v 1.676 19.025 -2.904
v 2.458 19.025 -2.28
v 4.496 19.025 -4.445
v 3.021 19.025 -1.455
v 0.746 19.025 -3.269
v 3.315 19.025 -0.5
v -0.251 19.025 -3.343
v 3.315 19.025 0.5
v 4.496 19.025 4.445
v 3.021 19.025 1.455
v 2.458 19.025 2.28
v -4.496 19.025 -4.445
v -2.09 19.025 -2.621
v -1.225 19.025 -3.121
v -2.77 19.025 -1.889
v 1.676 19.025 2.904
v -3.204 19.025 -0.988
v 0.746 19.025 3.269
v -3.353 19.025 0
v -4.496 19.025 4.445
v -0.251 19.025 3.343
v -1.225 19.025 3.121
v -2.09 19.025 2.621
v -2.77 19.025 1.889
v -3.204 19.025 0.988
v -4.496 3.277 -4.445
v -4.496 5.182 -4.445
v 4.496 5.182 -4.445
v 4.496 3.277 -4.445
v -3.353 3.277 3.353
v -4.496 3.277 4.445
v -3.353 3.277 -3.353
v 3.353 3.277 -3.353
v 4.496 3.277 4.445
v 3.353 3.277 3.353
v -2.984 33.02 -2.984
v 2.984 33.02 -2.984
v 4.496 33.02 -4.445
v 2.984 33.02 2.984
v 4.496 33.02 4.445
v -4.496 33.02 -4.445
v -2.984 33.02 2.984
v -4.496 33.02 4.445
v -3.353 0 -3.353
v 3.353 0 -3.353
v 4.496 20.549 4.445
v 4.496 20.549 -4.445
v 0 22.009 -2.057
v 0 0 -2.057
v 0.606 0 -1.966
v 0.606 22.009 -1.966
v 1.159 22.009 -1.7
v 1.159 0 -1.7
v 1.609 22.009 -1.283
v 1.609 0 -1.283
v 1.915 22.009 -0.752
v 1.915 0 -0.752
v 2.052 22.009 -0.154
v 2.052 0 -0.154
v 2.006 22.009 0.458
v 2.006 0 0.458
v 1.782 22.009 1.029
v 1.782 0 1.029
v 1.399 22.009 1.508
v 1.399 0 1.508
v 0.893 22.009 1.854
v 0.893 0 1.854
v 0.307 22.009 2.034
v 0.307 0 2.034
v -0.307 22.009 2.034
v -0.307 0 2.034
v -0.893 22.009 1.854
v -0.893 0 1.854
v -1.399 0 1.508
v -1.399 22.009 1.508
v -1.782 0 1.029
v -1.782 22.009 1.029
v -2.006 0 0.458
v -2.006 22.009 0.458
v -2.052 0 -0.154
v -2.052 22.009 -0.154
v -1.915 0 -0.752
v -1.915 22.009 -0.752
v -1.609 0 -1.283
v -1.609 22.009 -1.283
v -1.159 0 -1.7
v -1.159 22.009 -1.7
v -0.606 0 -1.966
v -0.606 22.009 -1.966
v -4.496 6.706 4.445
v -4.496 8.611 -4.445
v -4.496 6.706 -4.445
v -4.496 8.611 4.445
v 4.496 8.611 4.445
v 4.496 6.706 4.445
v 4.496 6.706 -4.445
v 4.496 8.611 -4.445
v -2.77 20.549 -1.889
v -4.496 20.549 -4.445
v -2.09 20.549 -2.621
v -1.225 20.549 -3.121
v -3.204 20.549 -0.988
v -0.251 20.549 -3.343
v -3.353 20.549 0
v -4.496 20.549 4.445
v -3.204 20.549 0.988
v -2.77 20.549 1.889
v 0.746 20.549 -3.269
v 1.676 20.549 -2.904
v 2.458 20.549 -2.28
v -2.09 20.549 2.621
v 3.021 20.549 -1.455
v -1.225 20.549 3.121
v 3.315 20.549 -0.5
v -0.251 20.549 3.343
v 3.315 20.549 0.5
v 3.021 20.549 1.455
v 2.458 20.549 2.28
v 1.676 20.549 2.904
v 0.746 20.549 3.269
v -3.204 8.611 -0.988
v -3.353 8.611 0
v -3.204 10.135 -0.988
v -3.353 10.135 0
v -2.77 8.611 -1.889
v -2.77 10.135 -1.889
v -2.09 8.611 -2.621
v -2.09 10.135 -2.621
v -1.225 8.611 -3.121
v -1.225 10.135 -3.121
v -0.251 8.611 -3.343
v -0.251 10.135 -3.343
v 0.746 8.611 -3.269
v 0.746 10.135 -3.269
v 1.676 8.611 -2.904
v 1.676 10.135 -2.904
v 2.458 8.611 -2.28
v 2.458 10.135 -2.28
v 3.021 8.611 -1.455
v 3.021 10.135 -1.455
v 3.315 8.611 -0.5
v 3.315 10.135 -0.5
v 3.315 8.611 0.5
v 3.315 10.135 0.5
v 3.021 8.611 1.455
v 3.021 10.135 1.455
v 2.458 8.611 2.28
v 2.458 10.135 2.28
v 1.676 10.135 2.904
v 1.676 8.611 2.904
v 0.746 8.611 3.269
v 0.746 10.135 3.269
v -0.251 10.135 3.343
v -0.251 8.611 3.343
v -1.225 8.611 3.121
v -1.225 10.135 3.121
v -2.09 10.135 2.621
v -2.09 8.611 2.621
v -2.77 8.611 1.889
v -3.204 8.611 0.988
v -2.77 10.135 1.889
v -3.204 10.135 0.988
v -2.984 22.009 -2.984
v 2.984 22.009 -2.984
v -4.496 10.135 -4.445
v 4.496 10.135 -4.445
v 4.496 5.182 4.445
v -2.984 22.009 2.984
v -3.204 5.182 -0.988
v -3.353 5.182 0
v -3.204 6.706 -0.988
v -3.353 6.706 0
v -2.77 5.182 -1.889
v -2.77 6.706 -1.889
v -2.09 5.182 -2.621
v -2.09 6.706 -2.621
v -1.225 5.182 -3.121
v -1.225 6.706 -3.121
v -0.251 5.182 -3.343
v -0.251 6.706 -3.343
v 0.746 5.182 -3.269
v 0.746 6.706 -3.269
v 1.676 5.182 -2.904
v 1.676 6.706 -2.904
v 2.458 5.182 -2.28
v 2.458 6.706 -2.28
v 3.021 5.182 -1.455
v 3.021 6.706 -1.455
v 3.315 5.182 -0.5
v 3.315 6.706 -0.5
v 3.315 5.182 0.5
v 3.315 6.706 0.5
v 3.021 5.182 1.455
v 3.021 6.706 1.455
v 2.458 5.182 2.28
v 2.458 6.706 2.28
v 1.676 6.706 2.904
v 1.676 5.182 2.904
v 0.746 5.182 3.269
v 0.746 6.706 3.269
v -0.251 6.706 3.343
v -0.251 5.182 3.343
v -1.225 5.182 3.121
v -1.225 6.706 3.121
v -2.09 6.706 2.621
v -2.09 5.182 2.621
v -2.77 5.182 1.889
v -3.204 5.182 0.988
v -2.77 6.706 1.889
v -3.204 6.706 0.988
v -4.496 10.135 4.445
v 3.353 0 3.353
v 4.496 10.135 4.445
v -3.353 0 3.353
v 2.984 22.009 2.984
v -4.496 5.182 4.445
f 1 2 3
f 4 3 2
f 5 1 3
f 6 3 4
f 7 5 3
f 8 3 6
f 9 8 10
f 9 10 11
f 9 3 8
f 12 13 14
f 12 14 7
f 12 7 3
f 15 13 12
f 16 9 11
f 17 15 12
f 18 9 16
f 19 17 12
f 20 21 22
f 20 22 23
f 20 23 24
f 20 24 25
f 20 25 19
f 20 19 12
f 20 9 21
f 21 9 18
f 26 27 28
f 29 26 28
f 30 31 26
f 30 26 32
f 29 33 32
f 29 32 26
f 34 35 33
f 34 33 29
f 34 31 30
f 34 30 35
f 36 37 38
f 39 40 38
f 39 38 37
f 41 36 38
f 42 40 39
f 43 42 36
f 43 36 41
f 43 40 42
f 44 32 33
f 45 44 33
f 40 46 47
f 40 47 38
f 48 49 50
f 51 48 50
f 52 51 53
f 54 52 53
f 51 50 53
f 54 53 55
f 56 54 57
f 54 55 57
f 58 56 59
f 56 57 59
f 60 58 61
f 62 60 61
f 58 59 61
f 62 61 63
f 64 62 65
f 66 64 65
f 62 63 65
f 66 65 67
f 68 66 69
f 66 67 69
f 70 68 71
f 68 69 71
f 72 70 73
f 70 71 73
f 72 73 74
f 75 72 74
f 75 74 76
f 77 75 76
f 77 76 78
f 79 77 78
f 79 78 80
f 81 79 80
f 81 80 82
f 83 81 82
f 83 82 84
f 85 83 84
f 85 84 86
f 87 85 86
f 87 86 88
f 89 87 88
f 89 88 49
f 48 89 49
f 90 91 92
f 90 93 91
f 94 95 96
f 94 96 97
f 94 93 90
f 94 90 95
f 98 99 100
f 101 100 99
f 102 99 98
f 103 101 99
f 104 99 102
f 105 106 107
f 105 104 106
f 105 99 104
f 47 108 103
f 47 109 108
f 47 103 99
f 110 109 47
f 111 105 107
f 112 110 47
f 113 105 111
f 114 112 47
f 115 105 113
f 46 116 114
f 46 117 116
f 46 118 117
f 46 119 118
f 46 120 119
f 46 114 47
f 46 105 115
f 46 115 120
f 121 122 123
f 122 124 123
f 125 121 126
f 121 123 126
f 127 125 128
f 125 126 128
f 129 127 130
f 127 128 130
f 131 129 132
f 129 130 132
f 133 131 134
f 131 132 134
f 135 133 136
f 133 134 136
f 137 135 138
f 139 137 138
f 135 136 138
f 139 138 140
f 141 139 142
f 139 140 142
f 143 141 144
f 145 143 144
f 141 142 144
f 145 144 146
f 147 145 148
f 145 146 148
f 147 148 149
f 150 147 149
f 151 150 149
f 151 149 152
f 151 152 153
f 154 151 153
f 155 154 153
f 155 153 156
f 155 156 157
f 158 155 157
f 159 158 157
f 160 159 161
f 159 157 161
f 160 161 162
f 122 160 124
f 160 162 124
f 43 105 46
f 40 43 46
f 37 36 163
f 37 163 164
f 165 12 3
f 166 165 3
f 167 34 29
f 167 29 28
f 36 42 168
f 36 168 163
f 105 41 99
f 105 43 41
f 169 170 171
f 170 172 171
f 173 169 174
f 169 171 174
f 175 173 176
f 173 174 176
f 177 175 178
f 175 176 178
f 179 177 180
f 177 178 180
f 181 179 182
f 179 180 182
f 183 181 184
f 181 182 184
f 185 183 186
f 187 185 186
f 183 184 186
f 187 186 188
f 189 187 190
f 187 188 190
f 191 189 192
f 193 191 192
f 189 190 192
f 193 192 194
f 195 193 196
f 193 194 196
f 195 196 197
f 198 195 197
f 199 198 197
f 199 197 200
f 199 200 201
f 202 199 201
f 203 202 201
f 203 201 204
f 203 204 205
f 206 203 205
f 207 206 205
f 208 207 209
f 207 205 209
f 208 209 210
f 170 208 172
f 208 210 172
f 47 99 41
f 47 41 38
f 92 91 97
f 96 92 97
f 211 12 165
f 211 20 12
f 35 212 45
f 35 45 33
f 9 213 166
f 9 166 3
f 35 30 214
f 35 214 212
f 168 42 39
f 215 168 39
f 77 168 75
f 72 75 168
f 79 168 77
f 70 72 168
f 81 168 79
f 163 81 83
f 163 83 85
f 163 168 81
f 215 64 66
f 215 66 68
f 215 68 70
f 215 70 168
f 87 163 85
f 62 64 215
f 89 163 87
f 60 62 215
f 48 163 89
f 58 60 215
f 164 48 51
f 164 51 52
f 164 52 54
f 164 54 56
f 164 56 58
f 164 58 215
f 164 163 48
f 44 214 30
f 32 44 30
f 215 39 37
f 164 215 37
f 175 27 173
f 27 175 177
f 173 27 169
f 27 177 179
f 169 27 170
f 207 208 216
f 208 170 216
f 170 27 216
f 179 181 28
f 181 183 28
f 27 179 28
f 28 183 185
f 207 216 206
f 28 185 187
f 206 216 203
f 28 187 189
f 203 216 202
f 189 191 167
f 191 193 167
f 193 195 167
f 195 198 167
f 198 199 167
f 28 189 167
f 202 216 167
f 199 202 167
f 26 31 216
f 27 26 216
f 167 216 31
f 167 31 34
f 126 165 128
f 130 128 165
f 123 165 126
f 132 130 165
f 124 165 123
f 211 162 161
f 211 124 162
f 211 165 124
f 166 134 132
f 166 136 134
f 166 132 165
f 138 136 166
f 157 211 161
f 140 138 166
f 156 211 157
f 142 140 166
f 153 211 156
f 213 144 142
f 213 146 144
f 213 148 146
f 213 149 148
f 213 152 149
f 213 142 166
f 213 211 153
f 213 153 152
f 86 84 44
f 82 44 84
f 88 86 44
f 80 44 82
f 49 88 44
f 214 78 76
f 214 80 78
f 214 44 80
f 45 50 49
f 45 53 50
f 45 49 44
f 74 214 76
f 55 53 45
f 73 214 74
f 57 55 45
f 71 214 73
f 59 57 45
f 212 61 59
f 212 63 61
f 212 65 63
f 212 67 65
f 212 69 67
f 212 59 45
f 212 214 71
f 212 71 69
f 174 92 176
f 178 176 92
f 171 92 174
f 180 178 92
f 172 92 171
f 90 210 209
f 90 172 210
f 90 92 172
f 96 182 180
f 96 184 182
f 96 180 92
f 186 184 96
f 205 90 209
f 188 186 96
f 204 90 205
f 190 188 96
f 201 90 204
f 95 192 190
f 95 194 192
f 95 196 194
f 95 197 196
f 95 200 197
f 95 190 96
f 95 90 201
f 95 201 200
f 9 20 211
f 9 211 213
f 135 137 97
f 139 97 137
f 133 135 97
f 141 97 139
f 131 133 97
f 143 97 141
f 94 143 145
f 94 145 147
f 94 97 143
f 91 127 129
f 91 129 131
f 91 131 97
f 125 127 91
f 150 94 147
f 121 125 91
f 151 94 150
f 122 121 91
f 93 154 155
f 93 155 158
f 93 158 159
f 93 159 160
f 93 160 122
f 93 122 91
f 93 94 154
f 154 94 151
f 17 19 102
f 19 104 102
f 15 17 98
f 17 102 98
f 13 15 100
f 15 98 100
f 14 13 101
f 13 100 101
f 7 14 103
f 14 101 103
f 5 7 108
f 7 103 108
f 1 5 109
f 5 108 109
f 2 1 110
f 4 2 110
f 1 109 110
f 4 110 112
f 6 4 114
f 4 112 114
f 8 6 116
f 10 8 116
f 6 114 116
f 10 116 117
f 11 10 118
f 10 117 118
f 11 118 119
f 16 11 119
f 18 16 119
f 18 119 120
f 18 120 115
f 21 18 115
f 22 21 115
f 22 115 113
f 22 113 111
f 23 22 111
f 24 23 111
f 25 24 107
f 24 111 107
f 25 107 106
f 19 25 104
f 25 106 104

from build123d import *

# Parameters (mm, degrees)
BOSS_EXTRUDE1_DEPTH = 4.445
SKETCH1_4_W         = 3.3528
SKETCH1_4_H         = 1.524
BOSS_EXTRUDE2_DEPTH = 4.445
SKETCH1_6_W         = 3.3528
SKETCH1_6_H         = 1.524
BOSS_EXTRUDE3_DEPTH = 4.445
SKETCH1_8_W         = 3.3528
SKETCH1_8_H         = 1.524
BOSS_EXTRUDE4_DEPTH = 4.445
SKETCH1_10_W        = 6.7056
SKETCH1_10_H        = 3.2766
BOSS_EXTRUDE5_DEPTH = 3.3528
SKETCH2_W           = 5.969
SKETCH2_H           = 5.969
CUT_EXTRUDE1_DEPTH  = 11.0109
CUT_EXTRUDE2_REACH  = 35.62
SKETCH3_R           = 2.0574


with BuildPart() as part:
    # Sketch1 → Boss-Extrude1 (new, symmetric)
    with BuildSketch(Plane.XY):
        Polygon((0, 5.1816), (-3.3528, 5.1816), (-4.4958, 5.1816), (-4.4958, 3.2766), (-3.3528, 3.2766), (3.3528, 3.2766), (4.4958, 3.2766), (4.4958, 5.1816), (3.3528, 5.1816), align=None)
    extrude(amount=BOSS_EXTRUDE1_DEPTH, both=True)

    # Sketch1<4> → Revolve1 (revolve)
    with BuildSketch(Plane.XY):
        with Locations((-1.6764, 5.9436)):
            Rectangle(SKETCH1_4_W, SKETCH1_4_H)
    revolve(axis=Axis((0, 6.7056, 0), (0, -1, 0)))

    # Sketch1<5> → Boss-Extrude2 (add, symmetric)
    with BuildSketch(Plane.XY):
        Polygon((0, 8.6106), (-3.3528, 8.6106), (-4.4958, 8.6106), (-4.4958, 6.7056), (-3.3528, 6.7056), (0, 6.7056), (3.3528, 6.7056), (4.4958, 6.7056), (4.4958, 8.6106), (3.3528, 8.6106), align=None)
    extrude(amount=BOSS_EXTRUDE2_DEPTH, both=True)

    # Sketch1<6> → Revolve2 (revolve)
    with BuildSketch(Plane.XY):
        with Locations((-1.6764, 9.3726)):
            Rectangle(SKETCH1_6_W, SKETCH1_6_H)
    revolve(axis=Axis((0, 10.1346, 0), (0, -1, 0)))

    # Sketch1<7> → Boss-Extrude3 (add, symmetric)
    with BuildSketch(Plane.XY):
        Polygon((-3.3528, 19.0246), (-4.4958, 19.0246), (-4.4958, 10.1346), (-3.3528, 10.1346), (0, 10.1346), (3.3528, 10.1346), (4.4958, 10.1346), (4.4958, 19.0246), (3.3528, 19.0246), (0, 19.0246), align=None)
    extrude(amount=BOSS_EXTRUDE3_DEPTH, both=True)

    # Sketch1<8> → Revolve3 (revolve)
    with BuildSketch(Plane.XY):
        with Locations((-1.6764, 19.7866)):
            Rectangle(SKETCH1_8_W, SKETCH1_8_H)
    revolve(axis=Axis((0, 20.5486, 0), (0, -1, 0)))

    # Sketch1<9> → Boss-Extrude4 (add, symmetric)
    with BuildSketch(Plane.XY):
        Polygon((-4.4958, 20.5486), (-3.3528, 20.5486), (0, 20.5486), (3.3528, 20.5486), (4.4958, 20.5486), (4.4958, 33.02), (-4.4958, 33.02), align=None)
    extrude(amount=BOSS_EXTRUDE4_DEPTH, both=True)

    # Sketch1<10> → Boss-Extrude5 (add, symmetric)
    with BuildSketch(Plane.XY):
        with Locations((0, 1.6383)):
            Rectangle(SKETCH1_10_W, SKETCH1_10_H)
    extrude(amount=BOSS_EXTRUDE5_DEPTH, both=True)

    # Sketch2 → Cut-Extrude1 (cut)
    with BuildSketch(Plane(origin=(0, 33.02, 0), x_dir=(1, 0, 0), z_dir=(0, 1, 0))):
        Rectangle(SKETCH2_W, SKETCH2_H)
    extrude(amount=-CUT_EXTRUDE1_DEPTH, mode=Mode.SUBTRACT)

    # Sketch3 → Cut-Extrude2 (cut, up to next)
    with BuildSketch(Plane(origin=(0, 0, 0), x_dir=(-1, 0, 0), z_dir=(0, -1, 0)), mode=Mode.PRIVATE) as cut_extrude2_sk1:
        Circle(SKETCH3_R)
    cut_extrude2_tool1 = extrude(cut_extrude2_sk1.sketch, amount=-CUT_EXTRUDE2_REACH, mode=Mode.PRIVATE) & part.part
    add(cut_extrude2_tool1.solids().sort_by_distance((0, 0, 0))[0], mode=Mode.SUBTRACT)


solid = part.part
